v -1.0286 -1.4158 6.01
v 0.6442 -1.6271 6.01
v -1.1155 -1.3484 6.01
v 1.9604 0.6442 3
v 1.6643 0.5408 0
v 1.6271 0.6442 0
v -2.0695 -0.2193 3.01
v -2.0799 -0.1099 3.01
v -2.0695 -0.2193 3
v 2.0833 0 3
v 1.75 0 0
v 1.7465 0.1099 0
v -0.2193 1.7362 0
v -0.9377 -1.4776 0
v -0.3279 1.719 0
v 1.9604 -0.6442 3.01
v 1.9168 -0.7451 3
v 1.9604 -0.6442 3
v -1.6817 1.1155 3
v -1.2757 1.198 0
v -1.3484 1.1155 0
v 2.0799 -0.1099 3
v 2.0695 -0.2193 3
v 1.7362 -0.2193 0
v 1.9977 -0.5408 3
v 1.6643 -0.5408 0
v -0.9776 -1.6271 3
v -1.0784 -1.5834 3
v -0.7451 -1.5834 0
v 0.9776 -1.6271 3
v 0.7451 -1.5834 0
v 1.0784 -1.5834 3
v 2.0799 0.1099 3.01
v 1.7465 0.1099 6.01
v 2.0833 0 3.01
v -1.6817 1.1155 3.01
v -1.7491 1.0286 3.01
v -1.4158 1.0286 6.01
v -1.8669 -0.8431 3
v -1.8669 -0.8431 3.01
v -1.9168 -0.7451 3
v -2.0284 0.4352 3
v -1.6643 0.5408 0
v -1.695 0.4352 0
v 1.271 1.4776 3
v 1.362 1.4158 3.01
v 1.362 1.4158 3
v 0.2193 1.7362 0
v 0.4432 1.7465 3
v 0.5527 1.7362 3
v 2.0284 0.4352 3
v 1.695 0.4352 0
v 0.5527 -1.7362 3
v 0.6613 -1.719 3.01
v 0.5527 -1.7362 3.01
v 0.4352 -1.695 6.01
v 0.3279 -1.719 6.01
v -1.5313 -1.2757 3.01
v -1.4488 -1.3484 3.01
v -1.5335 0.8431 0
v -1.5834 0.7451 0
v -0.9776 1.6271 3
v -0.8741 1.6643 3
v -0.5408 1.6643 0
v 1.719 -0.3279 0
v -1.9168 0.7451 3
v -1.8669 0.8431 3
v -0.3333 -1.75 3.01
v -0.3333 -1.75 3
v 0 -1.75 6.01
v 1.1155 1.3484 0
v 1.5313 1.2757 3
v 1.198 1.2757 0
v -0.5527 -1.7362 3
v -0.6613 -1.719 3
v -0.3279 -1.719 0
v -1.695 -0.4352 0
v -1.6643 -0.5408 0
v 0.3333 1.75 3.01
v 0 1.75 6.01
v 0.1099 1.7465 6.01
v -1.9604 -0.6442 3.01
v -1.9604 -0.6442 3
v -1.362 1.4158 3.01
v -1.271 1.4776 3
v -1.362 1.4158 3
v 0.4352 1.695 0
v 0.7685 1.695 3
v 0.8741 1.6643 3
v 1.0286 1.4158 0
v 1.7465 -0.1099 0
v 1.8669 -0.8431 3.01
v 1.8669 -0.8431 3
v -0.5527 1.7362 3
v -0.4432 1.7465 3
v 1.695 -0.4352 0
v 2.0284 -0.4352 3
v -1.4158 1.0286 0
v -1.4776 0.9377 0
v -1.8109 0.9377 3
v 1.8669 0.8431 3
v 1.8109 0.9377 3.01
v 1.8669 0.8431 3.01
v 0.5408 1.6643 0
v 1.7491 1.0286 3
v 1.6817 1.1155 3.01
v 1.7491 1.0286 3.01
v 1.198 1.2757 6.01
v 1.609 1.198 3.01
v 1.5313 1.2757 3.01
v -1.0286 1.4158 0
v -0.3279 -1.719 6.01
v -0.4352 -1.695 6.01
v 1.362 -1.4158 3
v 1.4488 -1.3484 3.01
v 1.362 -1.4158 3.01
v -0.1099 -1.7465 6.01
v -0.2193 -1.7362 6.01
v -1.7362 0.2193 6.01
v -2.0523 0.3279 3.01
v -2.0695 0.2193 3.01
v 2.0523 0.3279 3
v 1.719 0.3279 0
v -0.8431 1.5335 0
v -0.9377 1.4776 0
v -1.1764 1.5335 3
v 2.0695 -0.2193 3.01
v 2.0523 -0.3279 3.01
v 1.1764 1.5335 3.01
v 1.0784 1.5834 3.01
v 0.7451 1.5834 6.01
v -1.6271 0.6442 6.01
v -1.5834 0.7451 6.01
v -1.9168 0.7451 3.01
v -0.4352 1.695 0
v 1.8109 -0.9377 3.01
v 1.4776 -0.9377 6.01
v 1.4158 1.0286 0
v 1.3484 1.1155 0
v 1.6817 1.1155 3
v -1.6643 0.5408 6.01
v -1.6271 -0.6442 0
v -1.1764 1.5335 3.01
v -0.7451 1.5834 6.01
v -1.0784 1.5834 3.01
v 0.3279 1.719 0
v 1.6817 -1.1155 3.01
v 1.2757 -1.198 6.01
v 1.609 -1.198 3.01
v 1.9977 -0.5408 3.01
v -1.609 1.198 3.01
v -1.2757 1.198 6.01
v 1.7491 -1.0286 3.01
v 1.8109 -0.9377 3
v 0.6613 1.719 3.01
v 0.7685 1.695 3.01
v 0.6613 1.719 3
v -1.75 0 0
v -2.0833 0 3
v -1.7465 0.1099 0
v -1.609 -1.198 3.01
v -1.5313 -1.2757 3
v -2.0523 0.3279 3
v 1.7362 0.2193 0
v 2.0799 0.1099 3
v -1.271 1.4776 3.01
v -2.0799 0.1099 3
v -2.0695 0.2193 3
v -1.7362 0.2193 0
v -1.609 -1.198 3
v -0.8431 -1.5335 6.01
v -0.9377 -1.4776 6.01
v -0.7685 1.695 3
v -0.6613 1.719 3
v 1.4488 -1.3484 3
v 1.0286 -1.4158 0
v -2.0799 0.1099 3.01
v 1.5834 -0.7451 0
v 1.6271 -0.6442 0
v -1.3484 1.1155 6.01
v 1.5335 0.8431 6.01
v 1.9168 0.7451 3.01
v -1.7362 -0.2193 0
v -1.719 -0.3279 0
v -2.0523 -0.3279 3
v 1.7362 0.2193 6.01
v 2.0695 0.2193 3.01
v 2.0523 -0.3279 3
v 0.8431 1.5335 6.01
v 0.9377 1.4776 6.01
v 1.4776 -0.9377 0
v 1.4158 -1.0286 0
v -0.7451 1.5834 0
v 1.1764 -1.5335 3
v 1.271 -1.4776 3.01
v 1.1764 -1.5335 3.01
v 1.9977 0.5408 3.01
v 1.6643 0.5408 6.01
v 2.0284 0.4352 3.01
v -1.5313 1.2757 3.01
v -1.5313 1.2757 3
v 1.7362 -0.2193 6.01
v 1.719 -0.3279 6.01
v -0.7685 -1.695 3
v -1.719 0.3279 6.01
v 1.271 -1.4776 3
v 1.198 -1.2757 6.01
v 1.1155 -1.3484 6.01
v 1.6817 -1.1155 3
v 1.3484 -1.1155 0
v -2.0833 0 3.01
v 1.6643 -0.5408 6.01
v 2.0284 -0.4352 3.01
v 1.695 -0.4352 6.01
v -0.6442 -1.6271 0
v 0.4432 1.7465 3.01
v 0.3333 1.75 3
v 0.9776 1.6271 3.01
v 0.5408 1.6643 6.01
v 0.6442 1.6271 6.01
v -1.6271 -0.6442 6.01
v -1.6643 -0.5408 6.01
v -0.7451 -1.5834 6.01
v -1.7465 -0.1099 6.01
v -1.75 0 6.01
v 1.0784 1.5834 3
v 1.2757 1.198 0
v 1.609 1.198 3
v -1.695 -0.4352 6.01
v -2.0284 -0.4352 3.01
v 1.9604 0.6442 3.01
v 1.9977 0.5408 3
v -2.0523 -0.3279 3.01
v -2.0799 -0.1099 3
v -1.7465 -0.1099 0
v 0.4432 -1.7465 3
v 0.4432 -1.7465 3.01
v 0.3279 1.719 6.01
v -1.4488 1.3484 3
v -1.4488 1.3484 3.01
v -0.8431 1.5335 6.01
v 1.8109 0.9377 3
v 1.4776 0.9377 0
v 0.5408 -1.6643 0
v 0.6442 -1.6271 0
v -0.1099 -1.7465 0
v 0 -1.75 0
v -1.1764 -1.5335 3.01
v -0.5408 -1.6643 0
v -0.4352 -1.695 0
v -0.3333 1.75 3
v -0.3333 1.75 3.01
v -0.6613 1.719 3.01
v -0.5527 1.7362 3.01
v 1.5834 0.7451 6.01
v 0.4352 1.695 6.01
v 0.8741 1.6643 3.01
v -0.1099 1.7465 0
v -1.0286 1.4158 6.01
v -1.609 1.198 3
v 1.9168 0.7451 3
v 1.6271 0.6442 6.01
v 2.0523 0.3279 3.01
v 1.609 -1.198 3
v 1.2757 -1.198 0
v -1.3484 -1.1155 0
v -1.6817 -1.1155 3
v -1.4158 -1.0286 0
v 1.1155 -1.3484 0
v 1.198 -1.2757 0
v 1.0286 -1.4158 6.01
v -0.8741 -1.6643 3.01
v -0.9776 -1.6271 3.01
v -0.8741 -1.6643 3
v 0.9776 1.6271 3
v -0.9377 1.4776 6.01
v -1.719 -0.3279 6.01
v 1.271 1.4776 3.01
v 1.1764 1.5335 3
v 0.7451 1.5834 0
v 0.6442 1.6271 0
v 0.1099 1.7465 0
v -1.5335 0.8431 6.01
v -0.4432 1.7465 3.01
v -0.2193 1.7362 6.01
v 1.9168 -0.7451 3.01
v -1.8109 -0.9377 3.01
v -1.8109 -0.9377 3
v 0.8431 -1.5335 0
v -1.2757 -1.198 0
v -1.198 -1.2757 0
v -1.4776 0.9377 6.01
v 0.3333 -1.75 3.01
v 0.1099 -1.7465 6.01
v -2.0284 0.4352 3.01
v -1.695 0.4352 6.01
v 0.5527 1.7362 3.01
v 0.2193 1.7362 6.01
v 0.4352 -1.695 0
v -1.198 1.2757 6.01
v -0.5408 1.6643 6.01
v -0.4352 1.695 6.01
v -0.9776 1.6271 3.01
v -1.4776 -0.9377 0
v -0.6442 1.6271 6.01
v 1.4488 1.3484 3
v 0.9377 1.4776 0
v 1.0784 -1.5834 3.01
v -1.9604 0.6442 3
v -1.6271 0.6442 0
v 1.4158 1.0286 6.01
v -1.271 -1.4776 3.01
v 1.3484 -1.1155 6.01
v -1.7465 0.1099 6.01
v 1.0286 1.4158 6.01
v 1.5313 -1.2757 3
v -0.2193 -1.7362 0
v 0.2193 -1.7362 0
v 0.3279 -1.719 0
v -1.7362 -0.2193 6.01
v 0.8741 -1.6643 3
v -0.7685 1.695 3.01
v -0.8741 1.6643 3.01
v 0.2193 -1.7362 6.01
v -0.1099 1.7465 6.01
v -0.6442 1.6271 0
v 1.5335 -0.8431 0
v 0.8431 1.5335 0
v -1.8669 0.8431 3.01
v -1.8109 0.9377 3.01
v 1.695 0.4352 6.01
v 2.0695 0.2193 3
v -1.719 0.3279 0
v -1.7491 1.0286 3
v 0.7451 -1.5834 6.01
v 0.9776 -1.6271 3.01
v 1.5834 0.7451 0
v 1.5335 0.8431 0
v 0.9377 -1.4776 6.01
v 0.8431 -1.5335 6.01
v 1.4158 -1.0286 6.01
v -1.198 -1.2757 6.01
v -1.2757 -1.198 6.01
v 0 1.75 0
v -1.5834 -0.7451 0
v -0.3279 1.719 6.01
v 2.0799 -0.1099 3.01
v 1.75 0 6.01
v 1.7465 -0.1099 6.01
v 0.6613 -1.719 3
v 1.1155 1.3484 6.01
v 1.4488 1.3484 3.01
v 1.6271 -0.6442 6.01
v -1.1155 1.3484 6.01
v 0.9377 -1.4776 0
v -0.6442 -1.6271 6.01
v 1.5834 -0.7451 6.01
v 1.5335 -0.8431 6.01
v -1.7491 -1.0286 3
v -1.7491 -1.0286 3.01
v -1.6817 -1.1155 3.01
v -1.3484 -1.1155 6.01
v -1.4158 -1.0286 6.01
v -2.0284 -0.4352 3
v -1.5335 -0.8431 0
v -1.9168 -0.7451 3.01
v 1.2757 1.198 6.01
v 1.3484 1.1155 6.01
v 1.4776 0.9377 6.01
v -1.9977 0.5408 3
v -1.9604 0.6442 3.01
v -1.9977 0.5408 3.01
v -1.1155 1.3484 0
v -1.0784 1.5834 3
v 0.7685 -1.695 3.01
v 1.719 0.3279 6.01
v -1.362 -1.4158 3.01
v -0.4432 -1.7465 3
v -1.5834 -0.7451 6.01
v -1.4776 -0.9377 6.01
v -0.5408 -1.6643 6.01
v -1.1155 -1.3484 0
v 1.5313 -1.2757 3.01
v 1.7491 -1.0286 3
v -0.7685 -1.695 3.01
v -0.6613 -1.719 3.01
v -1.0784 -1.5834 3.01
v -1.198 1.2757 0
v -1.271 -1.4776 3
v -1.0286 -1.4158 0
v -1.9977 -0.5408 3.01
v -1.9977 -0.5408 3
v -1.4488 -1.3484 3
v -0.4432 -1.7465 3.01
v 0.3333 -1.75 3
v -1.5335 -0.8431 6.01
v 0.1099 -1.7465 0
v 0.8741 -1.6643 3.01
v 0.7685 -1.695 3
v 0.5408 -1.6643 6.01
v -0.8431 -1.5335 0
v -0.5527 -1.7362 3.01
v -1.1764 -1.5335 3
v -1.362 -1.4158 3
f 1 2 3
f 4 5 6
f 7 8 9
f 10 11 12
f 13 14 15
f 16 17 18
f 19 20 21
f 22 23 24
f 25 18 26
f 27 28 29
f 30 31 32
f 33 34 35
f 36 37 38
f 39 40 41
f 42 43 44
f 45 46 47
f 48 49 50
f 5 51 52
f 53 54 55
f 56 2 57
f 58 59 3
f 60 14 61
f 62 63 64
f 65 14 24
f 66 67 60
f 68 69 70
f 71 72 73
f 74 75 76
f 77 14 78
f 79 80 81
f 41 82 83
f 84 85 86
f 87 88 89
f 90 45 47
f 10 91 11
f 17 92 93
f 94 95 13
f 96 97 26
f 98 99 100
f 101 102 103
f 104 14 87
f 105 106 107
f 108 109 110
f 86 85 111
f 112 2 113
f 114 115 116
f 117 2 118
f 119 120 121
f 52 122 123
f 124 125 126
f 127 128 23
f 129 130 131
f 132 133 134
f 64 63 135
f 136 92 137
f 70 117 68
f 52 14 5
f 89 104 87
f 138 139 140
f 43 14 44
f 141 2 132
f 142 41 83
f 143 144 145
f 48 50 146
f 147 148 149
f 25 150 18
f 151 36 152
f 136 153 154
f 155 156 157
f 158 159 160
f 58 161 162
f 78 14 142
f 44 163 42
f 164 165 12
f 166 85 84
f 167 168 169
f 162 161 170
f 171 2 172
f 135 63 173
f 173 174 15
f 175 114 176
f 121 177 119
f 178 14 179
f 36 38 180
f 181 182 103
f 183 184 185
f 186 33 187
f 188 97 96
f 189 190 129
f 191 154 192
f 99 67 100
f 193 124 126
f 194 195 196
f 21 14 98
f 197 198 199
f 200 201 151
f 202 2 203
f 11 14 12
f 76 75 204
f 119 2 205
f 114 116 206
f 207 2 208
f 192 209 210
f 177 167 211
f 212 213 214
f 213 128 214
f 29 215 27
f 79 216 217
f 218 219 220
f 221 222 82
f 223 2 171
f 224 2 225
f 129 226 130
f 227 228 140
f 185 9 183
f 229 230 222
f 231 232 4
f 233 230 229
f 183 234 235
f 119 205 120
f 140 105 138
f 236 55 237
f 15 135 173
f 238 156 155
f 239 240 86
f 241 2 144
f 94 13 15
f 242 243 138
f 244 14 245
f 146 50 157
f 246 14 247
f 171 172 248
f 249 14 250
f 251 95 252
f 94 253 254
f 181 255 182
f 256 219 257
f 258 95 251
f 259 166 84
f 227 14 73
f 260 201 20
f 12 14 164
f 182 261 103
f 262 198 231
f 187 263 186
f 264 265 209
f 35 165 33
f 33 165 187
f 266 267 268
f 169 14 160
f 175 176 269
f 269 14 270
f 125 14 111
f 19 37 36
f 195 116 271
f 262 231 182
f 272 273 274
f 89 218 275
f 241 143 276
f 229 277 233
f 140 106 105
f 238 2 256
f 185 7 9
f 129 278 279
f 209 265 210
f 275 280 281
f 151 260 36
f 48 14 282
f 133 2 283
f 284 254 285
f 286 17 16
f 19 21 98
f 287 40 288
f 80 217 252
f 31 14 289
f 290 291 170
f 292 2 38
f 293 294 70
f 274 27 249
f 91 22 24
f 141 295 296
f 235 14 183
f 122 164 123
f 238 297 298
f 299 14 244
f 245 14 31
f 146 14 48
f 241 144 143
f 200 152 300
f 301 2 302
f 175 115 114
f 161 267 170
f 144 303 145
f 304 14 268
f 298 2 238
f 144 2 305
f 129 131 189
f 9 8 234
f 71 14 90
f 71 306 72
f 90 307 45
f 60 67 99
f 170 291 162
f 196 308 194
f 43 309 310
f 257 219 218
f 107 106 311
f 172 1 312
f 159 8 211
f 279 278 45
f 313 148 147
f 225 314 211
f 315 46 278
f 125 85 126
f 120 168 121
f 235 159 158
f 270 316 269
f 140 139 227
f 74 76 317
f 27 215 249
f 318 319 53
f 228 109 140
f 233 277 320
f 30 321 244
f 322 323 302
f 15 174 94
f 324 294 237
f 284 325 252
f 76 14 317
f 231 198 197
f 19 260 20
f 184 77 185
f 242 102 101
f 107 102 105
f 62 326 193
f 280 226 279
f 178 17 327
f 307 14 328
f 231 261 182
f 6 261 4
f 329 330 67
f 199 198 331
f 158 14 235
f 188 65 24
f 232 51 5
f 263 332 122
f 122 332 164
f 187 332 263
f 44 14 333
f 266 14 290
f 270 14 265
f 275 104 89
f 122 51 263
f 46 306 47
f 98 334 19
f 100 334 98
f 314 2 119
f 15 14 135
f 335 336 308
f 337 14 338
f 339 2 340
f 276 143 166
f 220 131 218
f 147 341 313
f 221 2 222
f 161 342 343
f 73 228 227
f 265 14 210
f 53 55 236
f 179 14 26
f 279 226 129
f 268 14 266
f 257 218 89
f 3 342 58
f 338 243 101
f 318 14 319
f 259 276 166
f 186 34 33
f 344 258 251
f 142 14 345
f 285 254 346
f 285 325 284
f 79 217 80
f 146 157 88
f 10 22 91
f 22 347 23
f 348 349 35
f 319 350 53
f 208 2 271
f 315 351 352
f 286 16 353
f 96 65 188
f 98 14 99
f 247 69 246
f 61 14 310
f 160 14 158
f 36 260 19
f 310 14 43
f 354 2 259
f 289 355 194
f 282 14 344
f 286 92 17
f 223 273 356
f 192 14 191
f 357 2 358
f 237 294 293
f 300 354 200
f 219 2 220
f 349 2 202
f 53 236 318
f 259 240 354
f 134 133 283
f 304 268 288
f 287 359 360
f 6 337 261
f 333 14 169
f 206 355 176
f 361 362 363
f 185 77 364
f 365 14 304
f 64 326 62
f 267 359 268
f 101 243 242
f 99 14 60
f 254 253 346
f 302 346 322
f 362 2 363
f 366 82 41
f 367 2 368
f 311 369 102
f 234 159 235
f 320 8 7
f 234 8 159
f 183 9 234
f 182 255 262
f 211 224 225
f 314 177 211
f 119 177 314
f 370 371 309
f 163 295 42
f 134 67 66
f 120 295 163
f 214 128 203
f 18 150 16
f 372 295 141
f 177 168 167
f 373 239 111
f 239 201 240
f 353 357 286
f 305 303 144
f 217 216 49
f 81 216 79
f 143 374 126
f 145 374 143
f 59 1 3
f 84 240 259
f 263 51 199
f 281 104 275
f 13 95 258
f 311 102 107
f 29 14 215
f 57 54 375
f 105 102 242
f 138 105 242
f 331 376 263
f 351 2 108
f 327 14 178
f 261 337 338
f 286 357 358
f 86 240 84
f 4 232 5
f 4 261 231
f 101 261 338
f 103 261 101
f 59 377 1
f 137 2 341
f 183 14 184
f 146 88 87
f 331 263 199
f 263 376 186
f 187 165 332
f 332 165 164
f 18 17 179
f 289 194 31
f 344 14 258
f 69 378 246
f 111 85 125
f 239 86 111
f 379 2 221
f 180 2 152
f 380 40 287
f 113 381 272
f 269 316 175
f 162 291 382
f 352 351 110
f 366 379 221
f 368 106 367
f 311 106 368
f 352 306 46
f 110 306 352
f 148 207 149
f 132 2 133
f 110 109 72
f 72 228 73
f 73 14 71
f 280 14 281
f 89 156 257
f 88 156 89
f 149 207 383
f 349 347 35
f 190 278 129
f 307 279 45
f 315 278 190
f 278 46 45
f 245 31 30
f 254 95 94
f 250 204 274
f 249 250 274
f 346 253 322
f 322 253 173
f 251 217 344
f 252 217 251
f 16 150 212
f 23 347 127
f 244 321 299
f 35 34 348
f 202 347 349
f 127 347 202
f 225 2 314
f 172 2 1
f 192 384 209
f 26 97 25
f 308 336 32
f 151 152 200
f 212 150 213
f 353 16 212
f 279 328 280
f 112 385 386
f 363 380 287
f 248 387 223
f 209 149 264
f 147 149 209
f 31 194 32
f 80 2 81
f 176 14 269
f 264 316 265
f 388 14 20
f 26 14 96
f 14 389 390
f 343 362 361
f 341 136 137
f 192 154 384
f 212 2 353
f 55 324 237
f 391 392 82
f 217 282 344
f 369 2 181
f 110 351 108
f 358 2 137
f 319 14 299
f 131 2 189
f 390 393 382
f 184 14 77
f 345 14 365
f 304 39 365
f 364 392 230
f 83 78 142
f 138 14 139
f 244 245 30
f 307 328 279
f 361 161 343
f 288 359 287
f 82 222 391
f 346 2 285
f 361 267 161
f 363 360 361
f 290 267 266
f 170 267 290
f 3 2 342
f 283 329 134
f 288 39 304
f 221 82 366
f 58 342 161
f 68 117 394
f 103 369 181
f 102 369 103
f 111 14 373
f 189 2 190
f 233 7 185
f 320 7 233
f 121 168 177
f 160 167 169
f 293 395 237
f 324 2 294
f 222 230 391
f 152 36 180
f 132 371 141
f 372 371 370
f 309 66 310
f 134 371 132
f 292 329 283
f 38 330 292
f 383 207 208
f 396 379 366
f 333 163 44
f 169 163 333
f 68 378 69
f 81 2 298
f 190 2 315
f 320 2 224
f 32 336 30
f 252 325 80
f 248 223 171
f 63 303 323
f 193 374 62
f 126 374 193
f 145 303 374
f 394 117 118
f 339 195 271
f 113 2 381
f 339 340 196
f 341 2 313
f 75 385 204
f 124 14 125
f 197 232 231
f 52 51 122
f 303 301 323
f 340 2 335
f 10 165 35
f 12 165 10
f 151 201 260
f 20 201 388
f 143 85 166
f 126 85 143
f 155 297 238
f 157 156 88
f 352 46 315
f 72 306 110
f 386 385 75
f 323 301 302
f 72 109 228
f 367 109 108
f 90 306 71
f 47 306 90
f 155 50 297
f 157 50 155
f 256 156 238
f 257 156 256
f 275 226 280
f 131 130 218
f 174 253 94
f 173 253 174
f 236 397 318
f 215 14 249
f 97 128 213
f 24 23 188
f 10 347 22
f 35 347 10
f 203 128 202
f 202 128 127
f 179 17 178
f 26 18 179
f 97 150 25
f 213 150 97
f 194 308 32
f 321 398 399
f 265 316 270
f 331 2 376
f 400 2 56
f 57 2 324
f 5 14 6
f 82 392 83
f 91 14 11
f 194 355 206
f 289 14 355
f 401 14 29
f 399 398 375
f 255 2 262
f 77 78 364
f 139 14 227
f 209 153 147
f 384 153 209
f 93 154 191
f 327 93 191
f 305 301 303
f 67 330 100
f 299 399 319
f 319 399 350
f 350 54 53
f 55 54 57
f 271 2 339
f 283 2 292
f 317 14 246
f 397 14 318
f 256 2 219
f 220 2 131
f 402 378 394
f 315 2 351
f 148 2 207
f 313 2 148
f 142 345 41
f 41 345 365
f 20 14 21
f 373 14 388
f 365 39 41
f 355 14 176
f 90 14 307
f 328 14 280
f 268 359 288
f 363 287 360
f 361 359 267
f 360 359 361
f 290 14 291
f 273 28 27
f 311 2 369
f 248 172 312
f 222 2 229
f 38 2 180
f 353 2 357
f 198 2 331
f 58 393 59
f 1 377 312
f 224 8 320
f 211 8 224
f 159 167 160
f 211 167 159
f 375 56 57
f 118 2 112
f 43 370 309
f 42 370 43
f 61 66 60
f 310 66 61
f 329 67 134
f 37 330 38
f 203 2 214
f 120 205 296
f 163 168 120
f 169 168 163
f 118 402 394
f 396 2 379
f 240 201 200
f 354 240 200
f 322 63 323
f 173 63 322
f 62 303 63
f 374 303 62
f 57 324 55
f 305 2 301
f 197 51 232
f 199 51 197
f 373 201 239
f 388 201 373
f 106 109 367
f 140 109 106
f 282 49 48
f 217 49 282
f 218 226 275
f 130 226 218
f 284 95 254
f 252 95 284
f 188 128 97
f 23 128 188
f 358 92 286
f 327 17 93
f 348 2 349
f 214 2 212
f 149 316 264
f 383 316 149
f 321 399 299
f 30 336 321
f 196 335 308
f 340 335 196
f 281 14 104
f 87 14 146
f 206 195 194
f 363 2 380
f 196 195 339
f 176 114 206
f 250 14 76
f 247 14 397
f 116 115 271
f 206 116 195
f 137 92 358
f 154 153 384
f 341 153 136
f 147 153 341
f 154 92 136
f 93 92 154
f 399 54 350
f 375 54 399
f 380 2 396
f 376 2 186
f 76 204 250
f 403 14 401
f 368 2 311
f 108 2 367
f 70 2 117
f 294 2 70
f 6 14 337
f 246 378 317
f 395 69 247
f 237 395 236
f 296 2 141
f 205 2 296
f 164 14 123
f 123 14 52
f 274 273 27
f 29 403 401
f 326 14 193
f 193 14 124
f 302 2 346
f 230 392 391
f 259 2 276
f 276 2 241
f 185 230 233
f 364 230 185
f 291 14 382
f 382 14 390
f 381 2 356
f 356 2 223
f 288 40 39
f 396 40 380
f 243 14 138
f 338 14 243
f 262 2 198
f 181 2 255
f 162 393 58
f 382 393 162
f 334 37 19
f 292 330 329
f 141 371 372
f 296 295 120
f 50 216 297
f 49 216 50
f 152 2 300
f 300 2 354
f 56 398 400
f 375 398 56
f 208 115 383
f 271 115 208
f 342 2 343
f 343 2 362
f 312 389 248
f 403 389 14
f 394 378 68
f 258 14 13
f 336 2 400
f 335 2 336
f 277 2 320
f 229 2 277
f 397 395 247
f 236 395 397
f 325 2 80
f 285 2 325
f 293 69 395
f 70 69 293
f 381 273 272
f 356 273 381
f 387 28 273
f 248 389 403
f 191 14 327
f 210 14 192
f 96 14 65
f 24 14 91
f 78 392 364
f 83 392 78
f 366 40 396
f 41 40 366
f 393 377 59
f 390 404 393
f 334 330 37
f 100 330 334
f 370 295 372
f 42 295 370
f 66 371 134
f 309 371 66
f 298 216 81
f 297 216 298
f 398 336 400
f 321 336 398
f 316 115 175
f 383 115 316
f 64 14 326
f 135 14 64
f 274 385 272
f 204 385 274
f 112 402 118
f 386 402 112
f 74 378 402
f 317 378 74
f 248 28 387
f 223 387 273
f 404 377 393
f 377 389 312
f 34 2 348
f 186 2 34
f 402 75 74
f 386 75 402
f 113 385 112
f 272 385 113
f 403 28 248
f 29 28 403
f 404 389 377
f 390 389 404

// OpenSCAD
// de SQ3SWF 2020

$fn=100;

r = 200;            // dish radius, mm
f_d = 0.6;          // focal to diameter ratio

ch = 11;            // center hole radius, mm
thick = 0.8;        // thickness

step = 1;           // surface accuracy, mm
split = 4;          // split into x parts

h_pos=[15,110,194]; // position of the holes
h_dia=3.5;          // hole diameter         
h_edge_dist=4;      // distance from center of the hole to edge

mark_focal = 0;     // draws a sphere in focal point
                    // set to 0 when generating STL                    

cl_rim = 1;         // clip rim
cl_clear = 0.1;     // clip pin clearance gap
cl_hei = 4;         // clip pin height

///////////////////////////////////////////////

f = f_d*2*r;    // focal length
a = 1/(4*f);    // parabola coefficient

echo("Focal (mm)", f);
echo("Depth (mm)", a*r*r);
echo("F/d", f_d);
echo("a", a);

module dish() {
    rotate_extrude(angle=360/split) {
        v = [for (x = ch; x<=r; x=x+step) [ x, a*x*x ] ];
        w = [for (x = r; x>=ch; x=x-step) [ x, a*x*x-thick ] ];
        polygon(concat(v,w));
    }
}

module conn_holes(edge_dist, pos, dia) {
    for(dist = h_pos, side=[0,1]) {
        rotate([0,0,360/split*side])
        translate([dist,-(2*side-1)*h_edge_dist,a*dist*dist])
        rotate([0,atan2(-2*a*dist,1),0])
        cylinder(d=h_dia, h=2*thick, center=true);
    }
}

module dish_holes() {
    difference() {
        dish();
        conn_holes();
    }
}



if(mark_focal == 1) {
    translate([0,0,f]) color("red") sphere(d=10);
}

//dish_holes();

////////////////////////////////// clip(s)

module clip() {
    hull() {
        for(x=[-1,1]) {
            translate([h_edge_dist*x, 0, 0])
            cylinder(d=h_dia+cl_rim*2, h=1);
        }
    }

    for(x=[-1,1]) {
        translate([h_edge_dist*x, 0, 0])
        cylinder(d=h_dia-cl_clear*2, h=cl_hei);
    }

}

//clip();

module pin() {
    difference() {
        hull() {
            cylinder(d=h_dia, h=0.01);

            for(x=[-1,1])
                translate([x/3,0,3])
            cylinder(d=h_dia, h=0.01);
            translate([0,0,6])
            cylinder(d=h_dia, h=0.01);
        }
        
        
    }
}

pin();
